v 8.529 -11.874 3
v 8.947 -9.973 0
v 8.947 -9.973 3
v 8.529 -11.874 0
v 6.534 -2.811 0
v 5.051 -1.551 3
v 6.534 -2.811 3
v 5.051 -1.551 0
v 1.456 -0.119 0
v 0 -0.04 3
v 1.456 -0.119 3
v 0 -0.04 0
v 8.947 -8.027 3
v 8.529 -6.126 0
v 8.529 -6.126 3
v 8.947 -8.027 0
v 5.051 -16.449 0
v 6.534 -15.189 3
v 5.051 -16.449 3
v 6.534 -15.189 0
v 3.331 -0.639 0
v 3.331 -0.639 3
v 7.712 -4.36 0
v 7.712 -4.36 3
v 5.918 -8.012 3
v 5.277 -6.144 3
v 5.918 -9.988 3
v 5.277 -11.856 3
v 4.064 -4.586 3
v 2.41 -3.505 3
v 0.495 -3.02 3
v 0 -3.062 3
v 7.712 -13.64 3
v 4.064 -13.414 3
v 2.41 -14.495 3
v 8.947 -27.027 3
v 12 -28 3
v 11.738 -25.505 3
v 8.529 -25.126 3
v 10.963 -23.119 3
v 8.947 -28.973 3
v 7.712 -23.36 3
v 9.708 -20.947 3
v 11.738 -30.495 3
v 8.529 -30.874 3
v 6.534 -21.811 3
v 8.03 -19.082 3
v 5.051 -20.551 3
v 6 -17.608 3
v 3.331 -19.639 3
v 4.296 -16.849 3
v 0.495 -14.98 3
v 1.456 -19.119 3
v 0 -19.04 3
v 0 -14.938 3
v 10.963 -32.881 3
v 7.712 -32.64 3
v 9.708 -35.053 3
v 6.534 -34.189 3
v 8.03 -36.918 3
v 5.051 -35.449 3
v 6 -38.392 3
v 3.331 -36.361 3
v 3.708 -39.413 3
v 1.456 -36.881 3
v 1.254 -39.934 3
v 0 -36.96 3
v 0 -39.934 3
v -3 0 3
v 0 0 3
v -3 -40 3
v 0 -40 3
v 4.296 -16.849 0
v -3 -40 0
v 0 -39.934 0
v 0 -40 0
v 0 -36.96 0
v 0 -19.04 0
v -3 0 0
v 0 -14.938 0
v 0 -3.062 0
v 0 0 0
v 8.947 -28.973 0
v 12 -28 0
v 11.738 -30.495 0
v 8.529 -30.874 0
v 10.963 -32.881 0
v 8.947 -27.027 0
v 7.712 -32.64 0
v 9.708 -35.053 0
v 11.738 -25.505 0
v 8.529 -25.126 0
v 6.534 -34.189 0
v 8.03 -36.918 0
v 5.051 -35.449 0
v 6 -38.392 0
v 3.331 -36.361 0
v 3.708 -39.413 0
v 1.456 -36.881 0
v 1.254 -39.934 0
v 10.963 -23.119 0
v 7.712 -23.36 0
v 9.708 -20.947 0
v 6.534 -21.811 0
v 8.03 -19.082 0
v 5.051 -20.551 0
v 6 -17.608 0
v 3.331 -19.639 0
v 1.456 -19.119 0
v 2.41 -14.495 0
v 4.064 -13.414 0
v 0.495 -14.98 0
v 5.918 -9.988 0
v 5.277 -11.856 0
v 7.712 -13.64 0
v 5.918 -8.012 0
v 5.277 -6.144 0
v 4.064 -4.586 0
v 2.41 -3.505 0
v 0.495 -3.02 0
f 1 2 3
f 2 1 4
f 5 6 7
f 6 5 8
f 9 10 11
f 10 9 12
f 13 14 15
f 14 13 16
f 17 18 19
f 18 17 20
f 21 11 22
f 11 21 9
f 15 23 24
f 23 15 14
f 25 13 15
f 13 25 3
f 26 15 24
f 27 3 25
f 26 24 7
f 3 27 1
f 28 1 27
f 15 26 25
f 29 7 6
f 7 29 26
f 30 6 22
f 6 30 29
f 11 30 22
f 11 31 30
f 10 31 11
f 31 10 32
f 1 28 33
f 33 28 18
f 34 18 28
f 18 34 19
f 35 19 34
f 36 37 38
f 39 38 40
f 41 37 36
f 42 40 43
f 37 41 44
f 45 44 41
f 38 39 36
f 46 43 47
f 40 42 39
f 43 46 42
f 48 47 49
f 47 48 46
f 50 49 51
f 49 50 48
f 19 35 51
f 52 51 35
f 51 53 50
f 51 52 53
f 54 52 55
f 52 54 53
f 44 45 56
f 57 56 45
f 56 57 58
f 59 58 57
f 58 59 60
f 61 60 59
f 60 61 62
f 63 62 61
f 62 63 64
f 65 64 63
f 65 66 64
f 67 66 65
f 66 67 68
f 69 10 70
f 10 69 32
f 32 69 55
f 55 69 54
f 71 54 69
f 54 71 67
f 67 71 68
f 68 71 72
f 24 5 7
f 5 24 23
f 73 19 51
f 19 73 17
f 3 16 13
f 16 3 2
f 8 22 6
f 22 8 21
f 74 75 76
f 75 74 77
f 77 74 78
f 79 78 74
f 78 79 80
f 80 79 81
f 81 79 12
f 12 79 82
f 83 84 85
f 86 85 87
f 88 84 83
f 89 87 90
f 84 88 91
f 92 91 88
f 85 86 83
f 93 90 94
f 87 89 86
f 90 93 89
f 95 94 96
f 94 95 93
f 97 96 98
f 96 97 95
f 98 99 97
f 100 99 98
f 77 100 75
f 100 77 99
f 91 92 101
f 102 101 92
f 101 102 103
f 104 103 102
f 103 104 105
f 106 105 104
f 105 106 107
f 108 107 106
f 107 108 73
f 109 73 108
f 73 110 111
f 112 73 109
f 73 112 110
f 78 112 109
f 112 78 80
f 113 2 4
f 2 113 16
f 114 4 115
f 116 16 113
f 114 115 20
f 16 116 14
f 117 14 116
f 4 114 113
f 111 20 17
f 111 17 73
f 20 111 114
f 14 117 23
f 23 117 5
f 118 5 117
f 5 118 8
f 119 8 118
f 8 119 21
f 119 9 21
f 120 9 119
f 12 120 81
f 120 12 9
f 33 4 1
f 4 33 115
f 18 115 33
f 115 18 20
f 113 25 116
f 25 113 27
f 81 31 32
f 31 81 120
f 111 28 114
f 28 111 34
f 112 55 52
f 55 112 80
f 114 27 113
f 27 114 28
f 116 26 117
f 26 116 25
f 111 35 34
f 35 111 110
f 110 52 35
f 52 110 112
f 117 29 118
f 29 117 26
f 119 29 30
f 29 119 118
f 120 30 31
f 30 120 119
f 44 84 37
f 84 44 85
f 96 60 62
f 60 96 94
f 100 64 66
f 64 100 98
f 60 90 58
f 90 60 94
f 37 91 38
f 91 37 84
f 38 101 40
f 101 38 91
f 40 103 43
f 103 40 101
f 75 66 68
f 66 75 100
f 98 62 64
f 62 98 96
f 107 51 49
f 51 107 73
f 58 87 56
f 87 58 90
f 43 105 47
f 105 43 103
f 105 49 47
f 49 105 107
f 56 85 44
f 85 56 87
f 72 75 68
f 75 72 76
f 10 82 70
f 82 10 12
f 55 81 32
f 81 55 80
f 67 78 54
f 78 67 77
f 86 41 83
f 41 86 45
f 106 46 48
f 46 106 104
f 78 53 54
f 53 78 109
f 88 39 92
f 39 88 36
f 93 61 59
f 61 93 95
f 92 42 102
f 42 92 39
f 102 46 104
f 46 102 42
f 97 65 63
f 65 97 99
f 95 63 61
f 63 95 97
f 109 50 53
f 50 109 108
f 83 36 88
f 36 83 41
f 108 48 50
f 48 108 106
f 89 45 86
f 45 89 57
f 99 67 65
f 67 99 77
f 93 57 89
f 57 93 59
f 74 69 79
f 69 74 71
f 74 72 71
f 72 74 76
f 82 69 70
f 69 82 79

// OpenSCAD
rotate([0,0,180])
  union(){ 
 
  union(){
    cube([3,40,3]);

  difference(){
   translate([0,9,0]) cylinder(3,9,9);

   translate([1,-1,-1]) cube(30);
  
    translate([0,9,-1]) cylinder(5,6,6);
}
  difference(){
   translate([0,28,0]) cylinder(3,12,12);
    translate([0,15,-1]) cube(40);
     translate([0,28,-1]) cylinder(5,9,9);
}
}
}
